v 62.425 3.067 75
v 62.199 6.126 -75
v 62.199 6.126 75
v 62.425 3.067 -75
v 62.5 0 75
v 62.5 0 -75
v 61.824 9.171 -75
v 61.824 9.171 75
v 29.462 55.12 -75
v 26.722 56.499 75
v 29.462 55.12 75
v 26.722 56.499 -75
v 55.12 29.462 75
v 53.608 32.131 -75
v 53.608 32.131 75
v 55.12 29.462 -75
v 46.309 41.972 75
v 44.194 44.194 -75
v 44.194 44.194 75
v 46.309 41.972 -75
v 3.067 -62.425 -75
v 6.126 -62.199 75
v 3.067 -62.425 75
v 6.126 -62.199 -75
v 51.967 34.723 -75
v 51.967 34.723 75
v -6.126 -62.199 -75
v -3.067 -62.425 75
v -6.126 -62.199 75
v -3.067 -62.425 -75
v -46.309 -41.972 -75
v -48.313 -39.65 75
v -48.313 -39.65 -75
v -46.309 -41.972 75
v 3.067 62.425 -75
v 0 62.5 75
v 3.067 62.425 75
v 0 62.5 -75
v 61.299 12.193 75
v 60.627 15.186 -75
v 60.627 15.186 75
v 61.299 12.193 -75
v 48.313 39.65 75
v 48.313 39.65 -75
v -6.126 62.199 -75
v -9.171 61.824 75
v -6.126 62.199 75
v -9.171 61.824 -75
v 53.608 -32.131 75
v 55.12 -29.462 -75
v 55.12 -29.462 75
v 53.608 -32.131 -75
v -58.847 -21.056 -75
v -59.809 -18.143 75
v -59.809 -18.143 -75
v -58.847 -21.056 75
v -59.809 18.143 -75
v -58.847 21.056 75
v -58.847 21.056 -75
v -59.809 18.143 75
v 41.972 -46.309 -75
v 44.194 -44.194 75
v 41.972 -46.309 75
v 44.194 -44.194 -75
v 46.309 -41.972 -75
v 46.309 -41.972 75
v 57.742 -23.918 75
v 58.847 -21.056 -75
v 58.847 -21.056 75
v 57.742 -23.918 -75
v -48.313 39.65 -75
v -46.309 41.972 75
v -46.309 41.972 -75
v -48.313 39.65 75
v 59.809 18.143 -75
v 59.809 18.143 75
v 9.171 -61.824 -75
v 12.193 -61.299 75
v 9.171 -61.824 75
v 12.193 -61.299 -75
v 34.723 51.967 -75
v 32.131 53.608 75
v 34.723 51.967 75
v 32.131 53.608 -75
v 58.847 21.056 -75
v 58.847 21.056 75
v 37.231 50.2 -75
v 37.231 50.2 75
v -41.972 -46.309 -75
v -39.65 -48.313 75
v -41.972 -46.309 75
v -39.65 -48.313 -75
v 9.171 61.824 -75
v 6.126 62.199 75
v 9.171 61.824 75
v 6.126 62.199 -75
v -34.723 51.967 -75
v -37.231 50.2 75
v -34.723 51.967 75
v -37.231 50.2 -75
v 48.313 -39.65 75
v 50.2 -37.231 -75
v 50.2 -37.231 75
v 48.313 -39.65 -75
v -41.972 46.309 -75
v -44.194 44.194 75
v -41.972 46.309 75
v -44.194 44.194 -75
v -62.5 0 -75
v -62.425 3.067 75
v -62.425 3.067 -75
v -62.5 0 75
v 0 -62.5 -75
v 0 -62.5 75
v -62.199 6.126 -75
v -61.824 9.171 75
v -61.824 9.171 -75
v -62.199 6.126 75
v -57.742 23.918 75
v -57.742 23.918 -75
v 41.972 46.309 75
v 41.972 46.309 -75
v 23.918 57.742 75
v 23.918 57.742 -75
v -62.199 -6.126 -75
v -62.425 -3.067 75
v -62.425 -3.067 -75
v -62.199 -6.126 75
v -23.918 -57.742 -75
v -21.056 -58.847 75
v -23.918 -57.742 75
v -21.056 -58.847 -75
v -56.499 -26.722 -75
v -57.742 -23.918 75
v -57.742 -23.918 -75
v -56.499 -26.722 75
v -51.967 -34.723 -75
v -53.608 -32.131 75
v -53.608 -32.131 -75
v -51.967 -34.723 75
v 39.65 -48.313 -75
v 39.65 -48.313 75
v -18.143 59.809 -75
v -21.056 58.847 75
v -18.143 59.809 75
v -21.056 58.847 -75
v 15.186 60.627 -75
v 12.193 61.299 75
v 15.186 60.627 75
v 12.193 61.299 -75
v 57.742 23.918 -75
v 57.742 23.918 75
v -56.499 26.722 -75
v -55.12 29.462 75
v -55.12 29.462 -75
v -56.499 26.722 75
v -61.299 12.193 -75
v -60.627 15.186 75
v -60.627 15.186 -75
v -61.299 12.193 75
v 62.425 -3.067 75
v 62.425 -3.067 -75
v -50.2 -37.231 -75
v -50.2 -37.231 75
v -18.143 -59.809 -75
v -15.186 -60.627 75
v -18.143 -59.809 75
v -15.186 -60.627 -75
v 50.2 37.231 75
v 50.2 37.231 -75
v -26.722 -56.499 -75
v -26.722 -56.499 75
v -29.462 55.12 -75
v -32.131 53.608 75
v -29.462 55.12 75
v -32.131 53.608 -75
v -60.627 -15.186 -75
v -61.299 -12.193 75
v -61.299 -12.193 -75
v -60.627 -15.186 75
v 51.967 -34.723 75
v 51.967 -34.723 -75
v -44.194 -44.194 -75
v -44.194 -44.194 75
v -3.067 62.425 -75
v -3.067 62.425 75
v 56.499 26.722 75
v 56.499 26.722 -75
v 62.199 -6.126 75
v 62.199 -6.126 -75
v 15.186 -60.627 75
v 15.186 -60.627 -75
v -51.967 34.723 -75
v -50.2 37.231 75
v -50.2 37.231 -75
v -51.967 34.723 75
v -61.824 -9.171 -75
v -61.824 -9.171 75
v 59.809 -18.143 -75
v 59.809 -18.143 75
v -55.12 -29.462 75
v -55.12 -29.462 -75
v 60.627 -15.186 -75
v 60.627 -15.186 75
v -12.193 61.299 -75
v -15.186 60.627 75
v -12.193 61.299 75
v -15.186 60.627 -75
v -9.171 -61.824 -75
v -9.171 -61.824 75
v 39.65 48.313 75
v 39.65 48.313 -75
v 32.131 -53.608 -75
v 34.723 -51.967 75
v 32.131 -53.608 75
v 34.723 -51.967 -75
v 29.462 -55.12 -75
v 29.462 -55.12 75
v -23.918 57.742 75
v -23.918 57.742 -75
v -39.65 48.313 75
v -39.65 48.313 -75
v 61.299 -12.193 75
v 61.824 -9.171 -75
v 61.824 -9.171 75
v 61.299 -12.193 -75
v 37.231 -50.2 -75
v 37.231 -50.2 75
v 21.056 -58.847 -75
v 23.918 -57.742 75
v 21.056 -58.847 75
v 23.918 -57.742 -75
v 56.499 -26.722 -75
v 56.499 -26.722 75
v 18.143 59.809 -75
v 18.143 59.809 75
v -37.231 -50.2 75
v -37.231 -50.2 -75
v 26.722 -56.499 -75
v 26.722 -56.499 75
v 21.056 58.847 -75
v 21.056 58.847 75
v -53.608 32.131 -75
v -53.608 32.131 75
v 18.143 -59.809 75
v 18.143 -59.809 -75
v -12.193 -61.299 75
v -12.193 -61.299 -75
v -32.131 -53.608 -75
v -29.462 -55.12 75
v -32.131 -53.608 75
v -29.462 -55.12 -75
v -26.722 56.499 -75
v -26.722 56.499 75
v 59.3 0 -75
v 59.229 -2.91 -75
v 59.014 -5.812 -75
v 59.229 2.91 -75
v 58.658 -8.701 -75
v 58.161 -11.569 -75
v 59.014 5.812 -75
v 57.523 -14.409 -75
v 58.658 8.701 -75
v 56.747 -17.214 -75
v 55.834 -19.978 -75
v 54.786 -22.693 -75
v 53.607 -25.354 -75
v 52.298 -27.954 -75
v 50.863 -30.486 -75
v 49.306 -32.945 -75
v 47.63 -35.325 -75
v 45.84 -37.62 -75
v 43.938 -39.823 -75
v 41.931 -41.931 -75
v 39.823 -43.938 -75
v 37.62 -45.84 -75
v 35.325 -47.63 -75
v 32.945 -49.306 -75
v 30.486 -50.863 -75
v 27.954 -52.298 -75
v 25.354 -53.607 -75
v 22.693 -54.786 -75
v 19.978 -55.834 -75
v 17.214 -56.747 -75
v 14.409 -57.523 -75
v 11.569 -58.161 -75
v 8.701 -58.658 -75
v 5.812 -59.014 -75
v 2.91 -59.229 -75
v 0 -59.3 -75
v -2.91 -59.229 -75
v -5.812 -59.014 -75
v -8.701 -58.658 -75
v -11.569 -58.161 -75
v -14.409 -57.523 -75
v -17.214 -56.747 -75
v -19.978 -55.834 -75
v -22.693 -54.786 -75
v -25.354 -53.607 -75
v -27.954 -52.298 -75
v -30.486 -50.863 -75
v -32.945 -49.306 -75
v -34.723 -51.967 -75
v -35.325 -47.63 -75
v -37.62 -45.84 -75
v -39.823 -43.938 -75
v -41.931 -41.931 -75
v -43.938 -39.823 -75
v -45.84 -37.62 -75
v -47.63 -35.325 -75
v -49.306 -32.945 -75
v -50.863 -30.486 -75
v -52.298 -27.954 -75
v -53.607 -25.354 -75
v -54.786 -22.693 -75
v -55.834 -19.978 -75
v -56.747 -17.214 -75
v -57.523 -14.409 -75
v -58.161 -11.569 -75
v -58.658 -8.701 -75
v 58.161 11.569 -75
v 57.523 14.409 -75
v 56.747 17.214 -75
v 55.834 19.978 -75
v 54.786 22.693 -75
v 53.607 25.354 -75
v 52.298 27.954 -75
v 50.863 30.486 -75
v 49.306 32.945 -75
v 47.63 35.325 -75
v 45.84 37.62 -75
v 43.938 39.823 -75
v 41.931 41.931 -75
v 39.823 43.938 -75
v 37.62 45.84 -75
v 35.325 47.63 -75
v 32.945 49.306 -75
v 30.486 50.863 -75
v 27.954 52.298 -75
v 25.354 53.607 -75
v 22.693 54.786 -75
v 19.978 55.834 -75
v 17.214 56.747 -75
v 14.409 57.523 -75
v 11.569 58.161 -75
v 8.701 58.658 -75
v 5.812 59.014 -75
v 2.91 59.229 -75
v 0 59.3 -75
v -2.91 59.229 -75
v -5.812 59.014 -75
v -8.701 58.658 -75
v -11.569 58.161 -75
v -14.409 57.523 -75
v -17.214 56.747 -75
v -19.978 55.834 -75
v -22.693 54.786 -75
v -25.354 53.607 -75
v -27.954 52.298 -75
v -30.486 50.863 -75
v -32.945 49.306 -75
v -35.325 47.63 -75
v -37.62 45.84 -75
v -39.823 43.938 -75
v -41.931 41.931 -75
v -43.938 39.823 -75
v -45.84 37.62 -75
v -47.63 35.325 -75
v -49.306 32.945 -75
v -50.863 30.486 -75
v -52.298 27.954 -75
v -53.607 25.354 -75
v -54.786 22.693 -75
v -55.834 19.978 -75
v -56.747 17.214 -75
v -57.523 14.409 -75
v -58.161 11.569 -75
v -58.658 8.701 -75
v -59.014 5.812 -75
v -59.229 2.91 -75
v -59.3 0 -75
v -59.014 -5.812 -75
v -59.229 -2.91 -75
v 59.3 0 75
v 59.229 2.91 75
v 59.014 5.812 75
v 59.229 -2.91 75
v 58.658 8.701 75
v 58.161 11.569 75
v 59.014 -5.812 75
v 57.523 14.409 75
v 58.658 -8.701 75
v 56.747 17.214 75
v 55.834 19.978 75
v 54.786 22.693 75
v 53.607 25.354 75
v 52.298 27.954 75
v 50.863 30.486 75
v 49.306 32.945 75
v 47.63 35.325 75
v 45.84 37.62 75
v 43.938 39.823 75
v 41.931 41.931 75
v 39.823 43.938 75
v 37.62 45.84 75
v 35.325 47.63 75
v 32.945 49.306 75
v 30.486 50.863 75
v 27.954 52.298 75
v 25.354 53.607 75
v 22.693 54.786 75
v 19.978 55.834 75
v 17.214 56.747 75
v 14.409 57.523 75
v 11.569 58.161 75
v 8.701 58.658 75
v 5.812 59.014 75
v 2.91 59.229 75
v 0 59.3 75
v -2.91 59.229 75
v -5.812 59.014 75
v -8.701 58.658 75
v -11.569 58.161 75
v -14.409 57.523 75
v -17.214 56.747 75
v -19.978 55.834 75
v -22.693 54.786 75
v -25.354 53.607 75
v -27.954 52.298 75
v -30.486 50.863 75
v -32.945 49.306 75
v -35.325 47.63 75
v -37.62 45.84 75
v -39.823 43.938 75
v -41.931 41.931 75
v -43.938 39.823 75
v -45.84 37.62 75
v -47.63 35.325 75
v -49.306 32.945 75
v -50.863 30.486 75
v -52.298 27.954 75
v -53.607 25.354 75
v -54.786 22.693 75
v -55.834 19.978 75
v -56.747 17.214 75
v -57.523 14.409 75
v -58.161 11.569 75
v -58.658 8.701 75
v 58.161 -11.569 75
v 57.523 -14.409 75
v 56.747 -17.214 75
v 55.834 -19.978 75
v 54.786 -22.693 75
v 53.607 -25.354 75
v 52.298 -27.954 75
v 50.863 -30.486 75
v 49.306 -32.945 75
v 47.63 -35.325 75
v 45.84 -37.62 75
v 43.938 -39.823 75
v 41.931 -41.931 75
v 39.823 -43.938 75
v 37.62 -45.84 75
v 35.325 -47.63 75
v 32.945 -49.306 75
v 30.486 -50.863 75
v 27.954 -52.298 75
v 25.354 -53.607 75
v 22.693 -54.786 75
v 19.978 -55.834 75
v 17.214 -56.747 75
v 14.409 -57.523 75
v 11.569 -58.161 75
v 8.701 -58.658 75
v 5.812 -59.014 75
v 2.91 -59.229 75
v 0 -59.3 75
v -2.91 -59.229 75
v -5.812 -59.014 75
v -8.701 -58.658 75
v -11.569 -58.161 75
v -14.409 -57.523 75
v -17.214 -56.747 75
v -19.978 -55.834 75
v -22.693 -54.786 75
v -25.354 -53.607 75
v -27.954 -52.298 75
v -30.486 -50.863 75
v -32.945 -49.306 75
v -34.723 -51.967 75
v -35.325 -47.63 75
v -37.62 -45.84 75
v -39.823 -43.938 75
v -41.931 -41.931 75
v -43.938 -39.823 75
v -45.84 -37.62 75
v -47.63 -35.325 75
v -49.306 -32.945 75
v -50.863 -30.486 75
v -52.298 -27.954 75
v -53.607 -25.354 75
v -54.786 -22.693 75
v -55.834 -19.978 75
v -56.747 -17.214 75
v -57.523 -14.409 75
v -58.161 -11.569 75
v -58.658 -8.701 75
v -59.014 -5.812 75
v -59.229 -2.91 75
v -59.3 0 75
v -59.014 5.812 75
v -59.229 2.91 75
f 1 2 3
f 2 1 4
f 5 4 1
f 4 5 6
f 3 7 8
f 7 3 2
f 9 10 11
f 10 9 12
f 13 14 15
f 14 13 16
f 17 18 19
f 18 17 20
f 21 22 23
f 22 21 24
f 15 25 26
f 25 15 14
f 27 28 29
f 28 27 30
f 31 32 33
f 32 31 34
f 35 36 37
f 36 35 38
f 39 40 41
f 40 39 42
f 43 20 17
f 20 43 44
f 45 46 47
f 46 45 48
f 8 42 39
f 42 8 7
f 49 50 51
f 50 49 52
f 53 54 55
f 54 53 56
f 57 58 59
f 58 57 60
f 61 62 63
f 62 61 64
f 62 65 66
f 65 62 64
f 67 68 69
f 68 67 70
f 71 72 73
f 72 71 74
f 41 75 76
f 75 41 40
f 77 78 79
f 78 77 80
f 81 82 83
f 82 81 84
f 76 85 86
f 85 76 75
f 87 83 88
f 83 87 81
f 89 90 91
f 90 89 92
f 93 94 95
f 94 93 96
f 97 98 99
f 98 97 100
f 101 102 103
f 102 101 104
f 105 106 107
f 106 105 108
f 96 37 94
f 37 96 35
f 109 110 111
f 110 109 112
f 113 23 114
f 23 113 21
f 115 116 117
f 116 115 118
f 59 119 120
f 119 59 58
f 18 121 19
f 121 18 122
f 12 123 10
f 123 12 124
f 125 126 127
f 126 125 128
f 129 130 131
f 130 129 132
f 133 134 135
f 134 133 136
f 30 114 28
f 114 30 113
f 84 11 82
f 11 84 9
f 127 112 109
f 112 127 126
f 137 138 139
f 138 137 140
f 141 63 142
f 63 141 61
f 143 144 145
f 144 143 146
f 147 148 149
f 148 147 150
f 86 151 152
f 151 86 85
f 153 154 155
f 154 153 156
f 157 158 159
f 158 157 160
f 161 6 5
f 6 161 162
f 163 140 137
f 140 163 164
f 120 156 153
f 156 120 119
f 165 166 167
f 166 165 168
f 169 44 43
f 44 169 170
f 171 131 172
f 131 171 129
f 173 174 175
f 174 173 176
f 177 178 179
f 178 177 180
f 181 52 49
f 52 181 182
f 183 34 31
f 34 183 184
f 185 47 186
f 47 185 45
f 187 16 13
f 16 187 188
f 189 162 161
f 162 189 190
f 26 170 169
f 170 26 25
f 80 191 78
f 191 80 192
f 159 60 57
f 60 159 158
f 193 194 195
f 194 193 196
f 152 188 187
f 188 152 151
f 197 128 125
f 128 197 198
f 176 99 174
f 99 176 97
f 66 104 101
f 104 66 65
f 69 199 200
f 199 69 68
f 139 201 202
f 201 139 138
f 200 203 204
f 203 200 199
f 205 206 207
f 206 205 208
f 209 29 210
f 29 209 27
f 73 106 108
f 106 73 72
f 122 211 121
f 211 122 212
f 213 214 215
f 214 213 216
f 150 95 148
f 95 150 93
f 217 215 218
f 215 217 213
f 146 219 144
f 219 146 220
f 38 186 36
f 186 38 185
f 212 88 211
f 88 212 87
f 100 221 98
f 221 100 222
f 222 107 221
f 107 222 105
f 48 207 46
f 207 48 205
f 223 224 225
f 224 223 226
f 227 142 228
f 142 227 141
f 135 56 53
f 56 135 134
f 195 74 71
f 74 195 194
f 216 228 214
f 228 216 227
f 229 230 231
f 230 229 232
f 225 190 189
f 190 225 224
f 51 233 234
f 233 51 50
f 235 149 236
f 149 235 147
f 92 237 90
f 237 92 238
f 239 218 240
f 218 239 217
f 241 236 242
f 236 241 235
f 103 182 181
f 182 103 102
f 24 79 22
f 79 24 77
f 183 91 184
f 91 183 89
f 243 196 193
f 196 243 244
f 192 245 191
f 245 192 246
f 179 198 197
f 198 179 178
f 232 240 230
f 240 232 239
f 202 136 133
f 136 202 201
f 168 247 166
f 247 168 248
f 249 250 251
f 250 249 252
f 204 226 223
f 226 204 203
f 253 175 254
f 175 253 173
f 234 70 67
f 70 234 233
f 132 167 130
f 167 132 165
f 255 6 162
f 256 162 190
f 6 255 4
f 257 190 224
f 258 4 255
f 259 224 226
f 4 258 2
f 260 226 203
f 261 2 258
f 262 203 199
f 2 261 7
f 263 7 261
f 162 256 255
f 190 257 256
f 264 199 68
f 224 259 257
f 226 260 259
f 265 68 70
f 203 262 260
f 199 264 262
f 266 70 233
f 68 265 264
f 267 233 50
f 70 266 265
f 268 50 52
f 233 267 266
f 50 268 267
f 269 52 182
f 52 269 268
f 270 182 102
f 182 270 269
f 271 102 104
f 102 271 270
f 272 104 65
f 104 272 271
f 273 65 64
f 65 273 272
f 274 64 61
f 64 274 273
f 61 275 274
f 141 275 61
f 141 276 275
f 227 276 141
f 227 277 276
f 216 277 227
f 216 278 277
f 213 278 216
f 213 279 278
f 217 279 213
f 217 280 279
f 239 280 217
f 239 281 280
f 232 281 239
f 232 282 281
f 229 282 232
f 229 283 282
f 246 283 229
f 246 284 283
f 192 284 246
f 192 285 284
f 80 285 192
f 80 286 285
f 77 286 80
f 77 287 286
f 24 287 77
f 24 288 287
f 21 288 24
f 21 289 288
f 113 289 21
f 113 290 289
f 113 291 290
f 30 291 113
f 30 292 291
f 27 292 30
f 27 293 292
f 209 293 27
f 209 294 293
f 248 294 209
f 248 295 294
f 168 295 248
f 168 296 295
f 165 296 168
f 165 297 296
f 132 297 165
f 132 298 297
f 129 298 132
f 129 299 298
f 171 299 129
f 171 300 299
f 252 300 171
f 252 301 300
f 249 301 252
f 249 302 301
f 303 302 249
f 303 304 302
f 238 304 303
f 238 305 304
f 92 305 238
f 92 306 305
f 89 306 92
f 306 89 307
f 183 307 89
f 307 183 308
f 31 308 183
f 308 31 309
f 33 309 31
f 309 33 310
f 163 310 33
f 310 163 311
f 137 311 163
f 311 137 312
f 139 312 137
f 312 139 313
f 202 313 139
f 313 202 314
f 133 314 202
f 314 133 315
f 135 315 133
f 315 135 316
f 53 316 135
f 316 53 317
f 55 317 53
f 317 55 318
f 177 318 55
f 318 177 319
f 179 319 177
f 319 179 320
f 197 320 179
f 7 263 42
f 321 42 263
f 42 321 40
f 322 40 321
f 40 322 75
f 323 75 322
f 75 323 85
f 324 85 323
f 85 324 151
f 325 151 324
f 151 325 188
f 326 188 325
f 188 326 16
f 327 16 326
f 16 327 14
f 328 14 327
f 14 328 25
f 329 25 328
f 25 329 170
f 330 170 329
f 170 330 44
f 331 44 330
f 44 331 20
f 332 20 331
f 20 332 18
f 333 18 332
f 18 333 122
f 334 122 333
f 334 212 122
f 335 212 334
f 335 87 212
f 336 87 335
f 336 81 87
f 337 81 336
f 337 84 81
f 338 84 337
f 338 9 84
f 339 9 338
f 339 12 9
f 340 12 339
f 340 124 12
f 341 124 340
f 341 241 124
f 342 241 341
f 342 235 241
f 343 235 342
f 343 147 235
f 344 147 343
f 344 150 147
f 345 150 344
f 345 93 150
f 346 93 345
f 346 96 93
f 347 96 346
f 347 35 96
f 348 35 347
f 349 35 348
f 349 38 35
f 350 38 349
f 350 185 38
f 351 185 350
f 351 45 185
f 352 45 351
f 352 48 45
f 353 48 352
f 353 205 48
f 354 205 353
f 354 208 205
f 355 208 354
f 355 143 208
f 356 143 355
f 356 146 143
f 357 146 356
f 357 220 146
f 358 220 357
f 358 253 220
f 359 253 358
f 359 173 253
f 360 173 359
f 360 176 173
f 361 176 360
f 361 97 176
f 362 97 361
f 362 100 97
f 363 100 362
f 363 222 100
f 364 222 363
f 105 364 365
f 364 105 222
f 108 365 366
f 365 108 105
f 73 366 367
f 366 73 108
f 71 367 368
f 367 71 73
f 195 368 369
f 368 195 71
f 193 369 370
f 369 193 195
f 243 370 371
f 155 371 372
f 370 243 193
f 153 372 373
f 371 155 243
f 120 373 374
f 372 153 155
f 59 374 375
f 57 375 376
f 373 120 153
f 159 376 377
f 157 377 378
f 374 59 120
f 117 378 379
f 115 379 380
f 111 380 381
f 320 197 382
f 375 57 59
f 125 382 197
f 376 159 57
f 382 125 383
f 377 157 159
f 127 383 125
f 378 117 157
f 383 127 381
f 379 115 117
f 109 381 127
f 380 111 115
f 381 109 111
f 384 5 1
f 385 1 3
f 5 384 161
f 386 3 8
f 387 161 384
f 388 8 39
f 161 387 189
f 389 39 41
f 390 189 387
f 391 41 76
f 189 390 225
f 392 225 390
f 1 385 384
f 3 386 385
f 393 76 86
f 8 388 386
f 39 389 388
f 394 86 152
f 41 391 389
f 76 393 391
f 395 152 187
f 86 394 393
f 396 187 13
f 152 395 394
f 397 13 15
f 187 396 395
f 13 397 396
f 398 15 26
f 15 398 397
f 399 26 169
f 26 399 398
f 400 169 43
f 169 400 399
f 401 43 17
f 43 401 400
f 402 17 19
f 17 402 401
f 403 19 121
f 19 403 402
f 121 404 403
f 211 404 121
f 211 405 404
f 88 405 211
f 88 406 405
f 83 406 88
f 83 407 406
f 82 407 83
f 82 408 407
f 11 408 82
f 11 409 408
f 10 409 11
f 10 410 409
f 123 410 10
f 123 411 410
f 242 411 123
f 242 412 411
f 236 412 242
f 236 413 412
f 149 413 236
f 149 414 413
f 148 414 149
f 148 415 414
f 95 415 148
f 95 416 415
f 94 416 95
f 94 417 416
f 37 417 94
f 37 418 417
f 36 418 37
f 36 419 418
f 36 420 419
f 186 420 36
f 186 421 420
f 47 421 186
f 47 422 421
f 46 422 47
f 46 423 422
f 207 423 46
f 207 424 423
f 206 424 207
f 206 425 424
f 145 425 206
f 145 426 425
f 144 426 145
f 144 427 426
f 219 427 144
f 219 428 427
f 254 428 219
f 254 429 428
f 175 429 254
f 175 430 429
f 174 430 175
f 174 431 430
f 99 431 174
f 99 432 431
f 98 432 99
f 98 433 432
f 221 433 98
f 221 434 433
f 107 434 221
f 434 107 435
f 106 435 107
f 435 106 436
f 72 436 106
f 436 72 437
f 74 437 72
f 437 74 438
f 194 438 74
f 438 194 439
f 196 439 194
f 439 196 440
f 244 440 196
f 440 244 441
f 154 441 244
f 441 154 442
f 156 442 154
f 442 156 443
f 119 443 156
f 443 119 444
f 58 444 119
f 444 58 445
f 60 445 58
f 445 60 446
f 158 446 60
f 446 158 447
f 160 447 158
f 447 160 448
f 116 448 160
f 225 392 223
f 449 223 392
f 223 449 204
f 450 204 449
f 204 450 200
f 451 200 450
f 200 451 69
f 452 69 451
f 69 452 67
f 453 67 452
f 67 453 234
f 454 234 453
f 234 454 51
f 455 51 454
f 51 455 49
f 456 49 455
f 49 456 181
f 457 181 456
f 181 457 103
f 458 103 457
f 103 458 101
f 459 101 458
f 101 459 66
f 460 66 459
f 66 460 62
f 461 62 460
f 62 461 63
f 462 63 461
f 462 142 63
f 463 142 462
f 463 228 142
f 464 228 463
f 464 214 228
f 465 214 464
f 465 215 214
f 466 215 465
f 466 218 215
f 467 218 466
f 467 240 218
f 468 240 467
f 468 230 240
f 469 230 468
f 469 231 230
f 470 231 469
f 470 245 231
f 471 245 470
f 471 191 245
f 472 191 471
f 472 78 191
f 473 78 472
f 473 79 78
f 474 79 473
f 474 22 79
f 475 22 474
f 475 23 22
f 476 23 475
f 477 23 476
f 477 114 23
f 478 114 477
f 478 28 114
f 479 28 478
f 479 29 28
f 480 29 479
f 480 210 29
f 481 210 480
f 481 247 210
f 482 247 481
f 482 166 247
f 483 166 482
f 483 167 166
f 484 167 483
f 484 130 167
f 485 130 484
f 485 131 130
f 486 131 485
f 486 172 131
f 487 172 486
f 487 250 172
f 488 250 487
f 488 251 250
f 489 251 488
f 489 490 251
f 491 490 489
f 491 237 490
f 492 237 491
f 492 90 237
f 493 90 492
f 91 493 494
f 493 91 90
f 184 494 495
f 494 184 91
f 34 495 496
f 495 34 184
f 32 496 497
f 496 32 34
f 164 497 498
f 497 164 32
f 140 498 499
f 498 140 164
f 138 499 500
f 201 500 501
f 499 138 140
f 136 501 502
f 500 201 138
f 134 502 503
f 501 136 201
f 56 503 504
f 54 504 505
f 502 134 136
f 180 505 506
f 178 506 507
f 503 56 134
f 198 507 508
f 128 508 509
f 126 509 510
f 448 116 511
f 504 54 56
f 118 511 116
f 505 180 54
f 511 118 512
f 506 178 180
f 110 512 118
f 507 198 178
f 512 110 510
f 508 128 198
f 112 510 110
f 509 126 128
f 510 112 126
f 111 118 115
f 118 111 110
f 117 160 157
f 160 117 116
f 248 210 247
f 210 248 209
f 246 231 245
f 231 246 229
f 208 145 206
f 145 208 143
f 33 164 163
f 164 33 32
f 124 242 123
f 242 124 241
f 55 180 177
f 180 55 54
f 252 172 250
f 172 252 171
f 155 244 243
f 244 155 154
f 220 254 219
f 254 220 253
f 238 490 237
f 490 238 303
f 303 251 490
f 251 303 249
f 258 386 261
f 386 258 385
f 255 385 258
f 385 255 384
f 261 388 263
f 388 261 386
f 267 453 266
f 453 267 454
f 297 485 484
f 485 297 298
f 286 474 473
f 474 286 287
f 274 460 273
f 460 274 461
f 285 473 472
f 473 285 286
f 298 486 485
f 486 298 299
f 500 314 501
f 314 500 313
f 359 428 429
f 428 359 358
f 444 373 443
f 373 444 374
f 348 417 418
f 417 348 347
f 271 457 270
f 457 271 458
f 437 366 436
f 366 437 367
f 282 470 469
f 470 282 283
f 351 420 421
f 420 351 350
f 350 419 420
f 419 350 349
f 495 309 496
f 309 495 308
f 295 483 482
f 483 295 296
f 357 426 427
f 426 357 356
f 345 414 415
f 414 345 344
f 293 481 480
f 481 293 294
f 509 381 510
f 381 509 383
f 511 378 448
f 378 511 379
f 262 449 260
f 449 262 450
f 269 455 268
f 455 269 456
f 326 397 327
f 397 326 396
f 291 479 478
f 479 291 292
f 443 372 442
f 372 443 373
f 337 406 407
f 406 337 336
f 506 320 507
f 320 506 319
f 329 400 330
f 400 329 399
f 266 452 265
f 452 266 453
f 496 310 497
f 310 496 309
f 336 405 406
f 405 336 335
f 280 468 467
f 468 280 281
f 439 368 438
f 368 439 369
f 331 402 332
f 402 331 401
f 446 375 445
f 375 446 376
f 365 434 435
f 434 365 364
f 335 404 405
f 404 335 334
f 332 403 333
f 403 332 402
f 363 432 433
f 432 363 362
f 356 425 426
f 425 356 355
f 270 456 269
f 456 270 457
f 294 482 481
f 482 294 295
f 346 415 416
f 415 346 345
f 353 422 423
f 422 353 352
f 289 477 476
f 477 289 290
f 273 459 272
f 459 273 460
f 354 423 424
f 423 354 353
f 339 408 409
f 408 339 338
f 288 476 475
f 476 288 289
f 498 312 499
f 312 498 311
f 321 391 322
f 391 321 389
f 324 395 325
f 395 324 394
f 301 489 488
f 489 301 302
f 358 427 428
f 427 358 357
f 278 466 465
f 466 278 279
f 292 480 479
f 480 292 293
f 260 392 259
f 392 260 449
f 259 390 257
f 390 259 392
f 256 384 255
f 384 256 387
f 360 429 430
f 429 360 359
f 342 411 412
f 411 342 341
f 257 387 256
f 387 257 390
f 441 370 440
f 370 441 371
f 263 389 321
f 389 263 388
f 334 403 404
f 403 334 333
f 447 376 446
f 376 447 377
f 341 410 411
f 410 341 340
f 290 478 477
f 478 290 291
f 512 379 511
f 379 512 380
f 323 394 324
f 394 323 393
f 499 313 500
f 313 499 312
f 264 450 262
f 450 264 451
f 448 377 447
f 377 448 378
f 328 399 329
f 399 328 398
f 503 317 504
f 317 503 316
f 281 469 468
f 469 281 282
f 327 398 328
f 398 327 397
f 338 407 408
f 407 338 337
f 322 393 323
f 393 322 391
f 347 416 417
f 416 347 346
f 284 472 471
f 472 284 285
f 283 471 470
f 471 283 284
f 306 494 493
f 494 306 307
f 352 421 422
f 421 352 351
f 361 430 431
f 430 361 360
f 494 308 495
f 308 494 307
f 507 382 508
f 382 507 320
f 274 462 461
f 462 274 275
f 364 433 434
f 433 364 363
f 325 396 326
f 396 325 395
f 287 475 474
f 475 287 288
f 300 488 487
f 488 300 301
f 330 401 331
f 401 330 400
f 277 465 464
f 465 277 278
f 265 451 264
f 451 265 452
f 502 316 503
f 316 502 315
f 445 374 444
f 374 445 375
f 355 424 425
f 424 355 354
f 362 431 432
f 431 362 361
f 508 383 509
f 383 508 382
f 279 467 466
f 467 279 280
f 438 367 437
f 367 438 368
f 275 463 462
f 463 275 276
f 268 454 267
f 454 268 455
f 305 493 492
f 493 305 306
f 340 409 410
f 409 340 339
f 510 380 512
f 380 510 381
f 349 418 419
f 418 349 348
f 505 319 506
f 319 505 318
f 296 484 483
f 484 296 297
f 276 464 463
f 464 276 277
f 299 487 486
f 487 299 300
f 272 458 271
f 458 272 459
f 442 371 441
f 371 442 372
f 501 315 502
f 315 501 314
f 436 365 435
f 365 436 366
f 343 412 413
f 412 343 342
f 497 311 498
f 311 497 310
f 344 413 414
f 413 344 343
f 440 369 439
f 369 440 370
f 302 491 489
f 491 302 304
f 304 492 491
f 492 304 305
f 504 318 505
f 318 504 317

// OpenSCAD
$fn=128;

module ht_pipe(od=125, length=150, wall=3.2) {
    difference() {
        cylinder(h=length, d=od, center=true);
        cylinder(h=length+0.2, d=od-2*wall, center=true);
    }
}

ht_pipe(od=125, length=150, wall=3.2);
